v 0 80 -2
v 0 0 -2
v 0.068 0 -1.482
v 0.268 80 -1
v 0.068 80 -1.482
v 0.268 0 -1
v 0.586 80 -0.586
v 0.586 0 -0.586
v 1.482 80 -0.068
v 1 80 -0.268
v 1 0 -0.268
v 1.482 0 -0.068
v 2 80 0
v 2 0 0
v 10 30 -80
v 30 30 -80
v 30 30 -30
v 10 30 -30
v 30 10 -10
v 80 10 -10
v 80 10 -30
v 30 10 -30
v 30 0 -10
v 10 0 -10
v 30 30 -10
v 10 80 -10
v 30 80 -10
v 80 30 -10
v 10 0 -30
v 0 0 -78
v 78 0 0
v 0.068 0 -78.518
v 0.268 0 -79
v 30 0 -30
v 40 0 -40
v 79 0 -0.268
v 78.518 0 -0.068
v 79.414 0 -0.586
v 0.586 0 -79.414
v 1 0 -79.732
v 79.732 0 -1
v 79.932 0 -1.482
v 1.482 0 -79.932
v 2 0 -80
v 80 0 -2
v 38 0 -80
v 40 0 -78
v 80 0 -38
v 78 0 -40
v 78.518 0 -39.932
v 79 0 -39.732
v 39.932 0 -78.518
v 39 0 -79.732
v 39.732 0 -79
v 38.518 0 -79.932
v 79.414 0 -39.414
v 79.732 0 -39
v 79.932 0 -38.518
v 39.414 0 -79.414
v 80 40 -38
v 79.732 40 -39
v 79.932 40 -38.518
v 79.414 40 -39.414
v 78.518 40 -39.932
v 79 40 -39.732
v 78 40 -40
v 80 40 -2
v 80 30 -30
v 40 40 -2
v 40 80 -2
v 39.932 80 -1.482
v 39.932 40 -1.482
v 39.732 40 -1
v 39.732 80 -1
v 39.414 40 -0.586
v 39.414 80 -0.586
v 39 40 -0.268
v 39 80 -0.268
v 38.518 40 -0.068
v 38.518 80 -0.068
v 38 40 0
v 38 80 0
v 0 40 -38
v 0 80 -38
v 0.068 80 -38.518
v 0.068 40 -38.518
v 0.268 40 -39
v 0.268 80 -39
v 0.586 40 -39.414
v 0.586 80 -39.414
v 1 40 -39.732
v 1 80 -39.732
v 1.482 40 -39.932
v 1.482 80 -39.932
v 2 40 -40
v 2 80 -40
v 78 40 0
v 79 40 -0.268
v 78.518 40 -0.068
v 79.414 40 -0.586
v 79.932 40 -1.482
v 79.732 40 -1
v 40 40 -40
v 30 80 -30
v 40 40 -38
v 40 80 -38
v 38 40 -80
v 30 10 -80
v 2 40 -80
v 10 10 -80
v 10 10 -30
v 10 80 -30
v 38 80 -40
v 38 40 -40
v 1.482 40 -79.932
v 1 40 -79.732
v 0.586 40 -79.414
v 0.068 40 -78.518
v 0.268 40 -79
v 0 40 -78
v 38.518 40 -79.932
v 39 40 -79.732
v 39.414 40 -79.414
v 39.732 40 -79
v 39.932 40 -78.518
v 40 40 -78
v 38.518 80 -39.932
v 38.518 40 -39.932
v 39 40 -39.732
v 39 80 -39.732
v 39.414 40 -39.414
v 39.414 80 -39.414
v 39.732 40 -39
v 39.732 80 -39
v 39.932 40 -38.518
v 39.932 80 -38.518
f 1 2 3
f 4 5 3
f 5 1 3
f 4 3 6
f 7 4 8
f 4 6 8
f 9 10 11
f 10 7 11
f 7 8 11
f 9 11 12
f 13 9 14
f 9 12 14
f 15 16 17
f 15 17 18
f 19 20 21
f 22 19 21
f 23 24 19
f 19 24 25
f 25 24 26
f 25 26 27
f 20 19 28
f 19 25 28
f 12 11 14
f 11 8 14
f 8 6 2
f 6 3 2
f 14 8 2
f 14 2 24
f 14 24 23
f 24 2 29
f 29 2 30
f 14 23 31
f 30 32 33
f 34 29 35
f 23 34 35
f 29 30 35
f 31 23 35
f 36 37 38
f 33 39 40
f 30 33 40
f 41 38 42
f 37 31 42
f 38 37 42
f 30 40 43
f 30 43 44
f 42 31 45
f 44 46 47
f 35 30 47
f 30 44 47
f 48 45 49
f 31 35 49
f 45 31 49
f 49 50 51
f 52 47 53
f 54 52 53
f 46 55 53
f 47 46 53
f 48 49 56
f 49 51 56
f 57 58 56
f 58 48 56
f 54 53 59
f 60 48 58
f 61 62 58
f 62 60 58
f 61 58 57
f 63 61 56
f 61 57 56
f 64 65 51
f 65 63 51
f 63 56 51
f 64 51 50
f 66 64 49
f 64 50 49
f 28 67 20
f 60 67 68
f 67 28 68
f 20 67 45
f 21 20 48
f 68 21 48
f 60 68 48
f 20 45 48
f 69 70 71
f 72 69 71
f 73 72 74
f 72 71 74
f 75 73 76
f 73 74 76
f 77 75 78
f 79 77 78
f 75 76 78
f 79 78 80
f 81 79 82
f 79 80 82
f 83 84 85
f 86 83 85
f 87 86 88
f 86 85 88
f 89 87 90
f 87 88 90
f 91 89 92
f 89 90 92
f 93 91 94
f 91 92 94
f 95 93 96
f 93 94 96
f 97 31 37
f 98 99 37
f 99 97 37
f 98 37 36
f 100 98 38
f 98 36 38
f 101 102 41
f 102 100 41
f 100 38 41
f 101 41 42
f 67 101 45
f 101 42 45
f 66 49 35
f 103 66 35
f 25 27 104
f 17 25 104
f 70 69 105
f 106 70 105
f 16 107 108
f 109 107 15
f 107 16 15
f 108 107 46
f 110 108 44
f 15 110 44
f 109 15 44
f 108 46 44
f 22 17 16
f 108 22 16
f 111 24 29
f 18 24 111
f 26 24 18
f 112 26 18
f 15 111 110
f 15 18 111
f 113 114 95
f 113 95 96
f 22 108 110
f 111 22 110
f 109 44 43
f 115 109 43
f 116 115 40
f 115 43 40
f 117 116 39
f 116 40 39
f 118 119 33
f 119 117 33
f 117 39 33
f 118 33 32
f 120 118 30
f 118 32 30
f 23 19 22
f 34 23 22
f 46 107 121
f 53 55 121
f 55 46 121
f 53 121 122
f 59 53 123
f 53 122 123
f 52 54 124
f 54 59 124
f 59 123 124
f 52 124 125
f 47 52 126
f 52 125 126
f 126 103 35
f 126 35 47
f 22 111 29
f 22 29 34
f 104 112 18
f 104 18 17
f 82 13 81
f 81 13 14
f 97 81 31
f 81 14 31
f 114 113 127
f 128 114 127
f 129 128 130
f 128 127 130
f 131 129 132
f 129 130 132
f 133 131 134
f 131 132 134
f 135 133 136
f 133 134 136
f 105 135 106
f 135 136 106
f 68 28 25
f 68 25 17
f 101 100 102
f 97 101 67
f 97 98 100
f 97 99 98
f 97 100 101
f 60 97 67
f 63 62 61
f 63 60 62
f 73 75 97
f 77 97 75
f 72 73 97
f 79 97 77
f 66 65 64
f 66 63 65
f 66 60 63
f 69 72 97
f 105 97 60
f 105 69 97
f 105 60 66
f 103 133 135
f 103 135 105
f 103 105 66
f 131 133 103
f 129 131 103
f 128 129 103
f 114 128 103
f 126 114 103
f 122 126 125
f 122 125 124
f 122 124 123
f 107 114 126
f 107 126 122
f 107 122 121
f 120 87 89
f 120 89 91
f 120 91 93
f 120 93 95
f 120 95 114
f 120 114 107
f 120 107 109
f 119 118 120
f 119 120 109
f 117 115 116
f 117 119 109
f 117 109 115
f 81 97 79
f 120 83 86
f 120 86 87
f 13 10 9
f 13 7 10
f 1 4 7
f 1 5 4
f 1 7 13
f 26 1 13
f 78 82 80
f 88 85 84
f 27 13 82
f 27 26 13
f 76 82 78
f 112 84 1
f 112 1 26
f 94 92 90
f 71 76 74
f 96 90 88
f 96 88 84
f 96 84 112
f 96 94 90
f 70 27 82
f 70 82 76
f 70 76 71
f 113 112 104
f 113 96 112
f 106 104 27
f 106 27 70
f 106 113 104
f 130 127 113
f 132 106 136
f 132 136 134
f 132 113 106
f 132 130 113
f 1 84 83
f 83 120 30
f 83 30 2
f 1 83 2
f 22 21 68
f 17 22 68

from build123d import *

# Parameters (mm, degrees)
SALIENTE_EXTRUIR1_DEPTH = 80
CROQUIS2_W              = 40
CROQUIS2_H              = 40
CORTAR_EXTRUIR1_DEPTH   = 80
CROQUIS3_W              = 40
CROQUIS3_H              = 40
CORTAR_EXTRUIR2_DEPTH   = 80
REDONDEO1_R             = 2
CROQUIS4_W              = 20
CROQUIS4_H              = 20
CORTAR_EXTRUIR3_DEPTH   = 80
CROQUIS5_W              = 20
CROQUIS5_H              = 20
CORTAR_EXTRUIR4_DEPTH   = 50
CROQUIS6_W              = 20
CROQUIS6_H              = 20
CORTAR_EXTRUIR5_DEPTH   = 50


with BuildPart() as part:
    # Croquis1 → Saliente-Extruir1 (new body)
    with BuildSketch(Plane(origin=(0, 0, 0), x_dir=(1, 0, 0), z_dir=(0, 1, 0))):
        Polygon((0, 80), (0, 0), (80, 0), (80, 40), (40, 40), (40, 80), align=None)
    extrude(amount=SALIENTE_EXTRUIR1_DEPTH)

    # Croquis2 → Cortar-Extruir1 (cut)
    with BuildSketch(Plane.XY):
        with Locations((60, 60)):
            Rectangle(CROQUIS2_W, CROQUIS2_H)
    extrude(amount=-CORTAR_EXTRUIR1_DEPTH, mode=Mode.SUBTRACT)

    # Croquis3 → Cortar-Extruir2 (cut)
    with BuildSketch(Plane(origin=(40, 0, 0), x_dir=(0, 0, -1), z_dir=(1, 0, 0))):
        with Locations((60, 60)):
            Rectangle(CROQUIS3_W, CROQUIS3_H)
    extrude(amount=-CORTAR_EXTRUIR2_DEPTH, mode=Mode.SUBTRACT)

    # Redondeo1
    # the kernel refuses this fillet: 2 mm, written as the material it takes off along each edge
    with BuildSketch(Plane(origin=(0, -5, 0), x_dir=(0, 0, -1), z_dir=(0, 1, 0))) as redondeo1_piece_1:
        with BuildLine():
            CenterArc((REDONDEO1_R, -REDONDEO1_R), REDONDEO1_R, 90, 90)
            Line((0, -REDONDEO1_R), (0, 0))
            Line((0, 0), (REDONDEO1_R, 0))
        make_face()
    extrude(amount=90, mode=Mode.SUBTRACT)
    with BuildSketch(Plane(origin=(80, -5, -40), x_dir=(0, 0, 1), z_dir=(0, 1, 0)), Plane(origin=(80, -5, 0), x_dir=(-1, 0, 0), z_dir=(0, 1, 0)), Plane(origin=(40, 45, -80), x_dir=(-1, 0, 0), z_dir=(0, -1, 0))) as redondeo1_piece_2:
        with BuildLine():
            CenterArc((REDONDEO1_R, -REDONDEO1_R), REDONDEO1_R, 90, 90)
            Line((0, -REDONDEO1_R), (0, 0))
            Line((0, 0), (REDONDEO1_R, 0))
        make_face()
    extrude(amount=50, mode=Mode.SUBTRACT)
    with BuildSketch(Plane(origin=(40, 85, 0), x_dir=(-1, 0, 0), z_dir=(0, -1, 0))) as redondeo1_piece_3:
        with BuildLine():
            CenterArc((REDONDEO1_R, REDONDEO1_R), REDONDEO1_R, 180, 90)
            Line((0, REDONDEO1_R), (0, 0))
            Line((0, 0), (REDONDEO1_R, 0))
        make_face()
    extrude(amount=45, mode=Mode.SUBTRACT)
    with BuildSketch(Plane(origin=(0, -5, -80), x_dir=(0, 0, 1), z_dir=(0, 1, 0))) as redondeo1_piece_4:
        with BuildLine():
            CenterArc((REDONDEO1_R, REDONDEO1_R), REDONDEO1_R, 180, 90)
            Line((0, REDONDEO1_R), (0, 0))
            Line((0, 0), (REDONDEO1_R, 0))
        make_face()
    extrude(amount=50, mode=Mode.SUBTRACT)
    with BuildSketch(Plane(origin=(0, 85, -40), x_dir=(0, 0, 1), z_dir=(0, -1, 0)), Plane(origin=(40, 85, -40), x_dir=(-1, 0, 0), z_dir=(0, -1, 0))) as redondeo1_piece_5:
        with BuildLine():
            CenterArc((REDONDEO1_R, -REDONDEO1_R), REDONDEO1_R, 90, 90)
            Line((0, -REDONDEO1_R), (0, 0))
            Line((0, 0), (REDONDEO1_R, 0))
        make_face()
    extrude(amount=45, mode=Mode.SUBTRACT)

    # Croquis4 → Cortar-Extruir3 (cut)
    with BuildSketch(Plane(origin=(0, 80, 0), x_dir=(1, 0, 0), z_dir=(0, 1, 0))):
        with Locations((20, 20)):
            Rectangle(CROQUIS4_W, CROQUIS4_H)
    extrude(amount=-CORTAR_EXTRUIR3_DEPTH, mode=Mode.SUBTRACT)

    # Croquis5 → Cortar-Extruir4 (cut)
    with BuildSketch(Plane(origin=(0, 0, -80), x_dir=(-1, 0, 0), z_dir=(0, 0, -1))):
        with Locations((-20, 20)):
            Rectangle(CROQUIS5_W, CROQUIS5_H)
    extrude(amount=-CORTAR_EXTRUIR4_DEPTH, mode=Mode.SUBTRACT)

    # Croquis6 → Cortar-Extruir5 (cut)
    with BuildSketch(Plane(origin=(80, 0, 0), x_dir=(0, 0, -1), z_dir=(1, 0, 0))):
        with Locations((20, 20)):
            Rectangle(CROQUIS6_W, CROQUIS6_H)
    extrude(amount=-CORTAR_EXTRUIR5_DEPTH, mode=Mode.SUBTRACT)


solid = part.part
